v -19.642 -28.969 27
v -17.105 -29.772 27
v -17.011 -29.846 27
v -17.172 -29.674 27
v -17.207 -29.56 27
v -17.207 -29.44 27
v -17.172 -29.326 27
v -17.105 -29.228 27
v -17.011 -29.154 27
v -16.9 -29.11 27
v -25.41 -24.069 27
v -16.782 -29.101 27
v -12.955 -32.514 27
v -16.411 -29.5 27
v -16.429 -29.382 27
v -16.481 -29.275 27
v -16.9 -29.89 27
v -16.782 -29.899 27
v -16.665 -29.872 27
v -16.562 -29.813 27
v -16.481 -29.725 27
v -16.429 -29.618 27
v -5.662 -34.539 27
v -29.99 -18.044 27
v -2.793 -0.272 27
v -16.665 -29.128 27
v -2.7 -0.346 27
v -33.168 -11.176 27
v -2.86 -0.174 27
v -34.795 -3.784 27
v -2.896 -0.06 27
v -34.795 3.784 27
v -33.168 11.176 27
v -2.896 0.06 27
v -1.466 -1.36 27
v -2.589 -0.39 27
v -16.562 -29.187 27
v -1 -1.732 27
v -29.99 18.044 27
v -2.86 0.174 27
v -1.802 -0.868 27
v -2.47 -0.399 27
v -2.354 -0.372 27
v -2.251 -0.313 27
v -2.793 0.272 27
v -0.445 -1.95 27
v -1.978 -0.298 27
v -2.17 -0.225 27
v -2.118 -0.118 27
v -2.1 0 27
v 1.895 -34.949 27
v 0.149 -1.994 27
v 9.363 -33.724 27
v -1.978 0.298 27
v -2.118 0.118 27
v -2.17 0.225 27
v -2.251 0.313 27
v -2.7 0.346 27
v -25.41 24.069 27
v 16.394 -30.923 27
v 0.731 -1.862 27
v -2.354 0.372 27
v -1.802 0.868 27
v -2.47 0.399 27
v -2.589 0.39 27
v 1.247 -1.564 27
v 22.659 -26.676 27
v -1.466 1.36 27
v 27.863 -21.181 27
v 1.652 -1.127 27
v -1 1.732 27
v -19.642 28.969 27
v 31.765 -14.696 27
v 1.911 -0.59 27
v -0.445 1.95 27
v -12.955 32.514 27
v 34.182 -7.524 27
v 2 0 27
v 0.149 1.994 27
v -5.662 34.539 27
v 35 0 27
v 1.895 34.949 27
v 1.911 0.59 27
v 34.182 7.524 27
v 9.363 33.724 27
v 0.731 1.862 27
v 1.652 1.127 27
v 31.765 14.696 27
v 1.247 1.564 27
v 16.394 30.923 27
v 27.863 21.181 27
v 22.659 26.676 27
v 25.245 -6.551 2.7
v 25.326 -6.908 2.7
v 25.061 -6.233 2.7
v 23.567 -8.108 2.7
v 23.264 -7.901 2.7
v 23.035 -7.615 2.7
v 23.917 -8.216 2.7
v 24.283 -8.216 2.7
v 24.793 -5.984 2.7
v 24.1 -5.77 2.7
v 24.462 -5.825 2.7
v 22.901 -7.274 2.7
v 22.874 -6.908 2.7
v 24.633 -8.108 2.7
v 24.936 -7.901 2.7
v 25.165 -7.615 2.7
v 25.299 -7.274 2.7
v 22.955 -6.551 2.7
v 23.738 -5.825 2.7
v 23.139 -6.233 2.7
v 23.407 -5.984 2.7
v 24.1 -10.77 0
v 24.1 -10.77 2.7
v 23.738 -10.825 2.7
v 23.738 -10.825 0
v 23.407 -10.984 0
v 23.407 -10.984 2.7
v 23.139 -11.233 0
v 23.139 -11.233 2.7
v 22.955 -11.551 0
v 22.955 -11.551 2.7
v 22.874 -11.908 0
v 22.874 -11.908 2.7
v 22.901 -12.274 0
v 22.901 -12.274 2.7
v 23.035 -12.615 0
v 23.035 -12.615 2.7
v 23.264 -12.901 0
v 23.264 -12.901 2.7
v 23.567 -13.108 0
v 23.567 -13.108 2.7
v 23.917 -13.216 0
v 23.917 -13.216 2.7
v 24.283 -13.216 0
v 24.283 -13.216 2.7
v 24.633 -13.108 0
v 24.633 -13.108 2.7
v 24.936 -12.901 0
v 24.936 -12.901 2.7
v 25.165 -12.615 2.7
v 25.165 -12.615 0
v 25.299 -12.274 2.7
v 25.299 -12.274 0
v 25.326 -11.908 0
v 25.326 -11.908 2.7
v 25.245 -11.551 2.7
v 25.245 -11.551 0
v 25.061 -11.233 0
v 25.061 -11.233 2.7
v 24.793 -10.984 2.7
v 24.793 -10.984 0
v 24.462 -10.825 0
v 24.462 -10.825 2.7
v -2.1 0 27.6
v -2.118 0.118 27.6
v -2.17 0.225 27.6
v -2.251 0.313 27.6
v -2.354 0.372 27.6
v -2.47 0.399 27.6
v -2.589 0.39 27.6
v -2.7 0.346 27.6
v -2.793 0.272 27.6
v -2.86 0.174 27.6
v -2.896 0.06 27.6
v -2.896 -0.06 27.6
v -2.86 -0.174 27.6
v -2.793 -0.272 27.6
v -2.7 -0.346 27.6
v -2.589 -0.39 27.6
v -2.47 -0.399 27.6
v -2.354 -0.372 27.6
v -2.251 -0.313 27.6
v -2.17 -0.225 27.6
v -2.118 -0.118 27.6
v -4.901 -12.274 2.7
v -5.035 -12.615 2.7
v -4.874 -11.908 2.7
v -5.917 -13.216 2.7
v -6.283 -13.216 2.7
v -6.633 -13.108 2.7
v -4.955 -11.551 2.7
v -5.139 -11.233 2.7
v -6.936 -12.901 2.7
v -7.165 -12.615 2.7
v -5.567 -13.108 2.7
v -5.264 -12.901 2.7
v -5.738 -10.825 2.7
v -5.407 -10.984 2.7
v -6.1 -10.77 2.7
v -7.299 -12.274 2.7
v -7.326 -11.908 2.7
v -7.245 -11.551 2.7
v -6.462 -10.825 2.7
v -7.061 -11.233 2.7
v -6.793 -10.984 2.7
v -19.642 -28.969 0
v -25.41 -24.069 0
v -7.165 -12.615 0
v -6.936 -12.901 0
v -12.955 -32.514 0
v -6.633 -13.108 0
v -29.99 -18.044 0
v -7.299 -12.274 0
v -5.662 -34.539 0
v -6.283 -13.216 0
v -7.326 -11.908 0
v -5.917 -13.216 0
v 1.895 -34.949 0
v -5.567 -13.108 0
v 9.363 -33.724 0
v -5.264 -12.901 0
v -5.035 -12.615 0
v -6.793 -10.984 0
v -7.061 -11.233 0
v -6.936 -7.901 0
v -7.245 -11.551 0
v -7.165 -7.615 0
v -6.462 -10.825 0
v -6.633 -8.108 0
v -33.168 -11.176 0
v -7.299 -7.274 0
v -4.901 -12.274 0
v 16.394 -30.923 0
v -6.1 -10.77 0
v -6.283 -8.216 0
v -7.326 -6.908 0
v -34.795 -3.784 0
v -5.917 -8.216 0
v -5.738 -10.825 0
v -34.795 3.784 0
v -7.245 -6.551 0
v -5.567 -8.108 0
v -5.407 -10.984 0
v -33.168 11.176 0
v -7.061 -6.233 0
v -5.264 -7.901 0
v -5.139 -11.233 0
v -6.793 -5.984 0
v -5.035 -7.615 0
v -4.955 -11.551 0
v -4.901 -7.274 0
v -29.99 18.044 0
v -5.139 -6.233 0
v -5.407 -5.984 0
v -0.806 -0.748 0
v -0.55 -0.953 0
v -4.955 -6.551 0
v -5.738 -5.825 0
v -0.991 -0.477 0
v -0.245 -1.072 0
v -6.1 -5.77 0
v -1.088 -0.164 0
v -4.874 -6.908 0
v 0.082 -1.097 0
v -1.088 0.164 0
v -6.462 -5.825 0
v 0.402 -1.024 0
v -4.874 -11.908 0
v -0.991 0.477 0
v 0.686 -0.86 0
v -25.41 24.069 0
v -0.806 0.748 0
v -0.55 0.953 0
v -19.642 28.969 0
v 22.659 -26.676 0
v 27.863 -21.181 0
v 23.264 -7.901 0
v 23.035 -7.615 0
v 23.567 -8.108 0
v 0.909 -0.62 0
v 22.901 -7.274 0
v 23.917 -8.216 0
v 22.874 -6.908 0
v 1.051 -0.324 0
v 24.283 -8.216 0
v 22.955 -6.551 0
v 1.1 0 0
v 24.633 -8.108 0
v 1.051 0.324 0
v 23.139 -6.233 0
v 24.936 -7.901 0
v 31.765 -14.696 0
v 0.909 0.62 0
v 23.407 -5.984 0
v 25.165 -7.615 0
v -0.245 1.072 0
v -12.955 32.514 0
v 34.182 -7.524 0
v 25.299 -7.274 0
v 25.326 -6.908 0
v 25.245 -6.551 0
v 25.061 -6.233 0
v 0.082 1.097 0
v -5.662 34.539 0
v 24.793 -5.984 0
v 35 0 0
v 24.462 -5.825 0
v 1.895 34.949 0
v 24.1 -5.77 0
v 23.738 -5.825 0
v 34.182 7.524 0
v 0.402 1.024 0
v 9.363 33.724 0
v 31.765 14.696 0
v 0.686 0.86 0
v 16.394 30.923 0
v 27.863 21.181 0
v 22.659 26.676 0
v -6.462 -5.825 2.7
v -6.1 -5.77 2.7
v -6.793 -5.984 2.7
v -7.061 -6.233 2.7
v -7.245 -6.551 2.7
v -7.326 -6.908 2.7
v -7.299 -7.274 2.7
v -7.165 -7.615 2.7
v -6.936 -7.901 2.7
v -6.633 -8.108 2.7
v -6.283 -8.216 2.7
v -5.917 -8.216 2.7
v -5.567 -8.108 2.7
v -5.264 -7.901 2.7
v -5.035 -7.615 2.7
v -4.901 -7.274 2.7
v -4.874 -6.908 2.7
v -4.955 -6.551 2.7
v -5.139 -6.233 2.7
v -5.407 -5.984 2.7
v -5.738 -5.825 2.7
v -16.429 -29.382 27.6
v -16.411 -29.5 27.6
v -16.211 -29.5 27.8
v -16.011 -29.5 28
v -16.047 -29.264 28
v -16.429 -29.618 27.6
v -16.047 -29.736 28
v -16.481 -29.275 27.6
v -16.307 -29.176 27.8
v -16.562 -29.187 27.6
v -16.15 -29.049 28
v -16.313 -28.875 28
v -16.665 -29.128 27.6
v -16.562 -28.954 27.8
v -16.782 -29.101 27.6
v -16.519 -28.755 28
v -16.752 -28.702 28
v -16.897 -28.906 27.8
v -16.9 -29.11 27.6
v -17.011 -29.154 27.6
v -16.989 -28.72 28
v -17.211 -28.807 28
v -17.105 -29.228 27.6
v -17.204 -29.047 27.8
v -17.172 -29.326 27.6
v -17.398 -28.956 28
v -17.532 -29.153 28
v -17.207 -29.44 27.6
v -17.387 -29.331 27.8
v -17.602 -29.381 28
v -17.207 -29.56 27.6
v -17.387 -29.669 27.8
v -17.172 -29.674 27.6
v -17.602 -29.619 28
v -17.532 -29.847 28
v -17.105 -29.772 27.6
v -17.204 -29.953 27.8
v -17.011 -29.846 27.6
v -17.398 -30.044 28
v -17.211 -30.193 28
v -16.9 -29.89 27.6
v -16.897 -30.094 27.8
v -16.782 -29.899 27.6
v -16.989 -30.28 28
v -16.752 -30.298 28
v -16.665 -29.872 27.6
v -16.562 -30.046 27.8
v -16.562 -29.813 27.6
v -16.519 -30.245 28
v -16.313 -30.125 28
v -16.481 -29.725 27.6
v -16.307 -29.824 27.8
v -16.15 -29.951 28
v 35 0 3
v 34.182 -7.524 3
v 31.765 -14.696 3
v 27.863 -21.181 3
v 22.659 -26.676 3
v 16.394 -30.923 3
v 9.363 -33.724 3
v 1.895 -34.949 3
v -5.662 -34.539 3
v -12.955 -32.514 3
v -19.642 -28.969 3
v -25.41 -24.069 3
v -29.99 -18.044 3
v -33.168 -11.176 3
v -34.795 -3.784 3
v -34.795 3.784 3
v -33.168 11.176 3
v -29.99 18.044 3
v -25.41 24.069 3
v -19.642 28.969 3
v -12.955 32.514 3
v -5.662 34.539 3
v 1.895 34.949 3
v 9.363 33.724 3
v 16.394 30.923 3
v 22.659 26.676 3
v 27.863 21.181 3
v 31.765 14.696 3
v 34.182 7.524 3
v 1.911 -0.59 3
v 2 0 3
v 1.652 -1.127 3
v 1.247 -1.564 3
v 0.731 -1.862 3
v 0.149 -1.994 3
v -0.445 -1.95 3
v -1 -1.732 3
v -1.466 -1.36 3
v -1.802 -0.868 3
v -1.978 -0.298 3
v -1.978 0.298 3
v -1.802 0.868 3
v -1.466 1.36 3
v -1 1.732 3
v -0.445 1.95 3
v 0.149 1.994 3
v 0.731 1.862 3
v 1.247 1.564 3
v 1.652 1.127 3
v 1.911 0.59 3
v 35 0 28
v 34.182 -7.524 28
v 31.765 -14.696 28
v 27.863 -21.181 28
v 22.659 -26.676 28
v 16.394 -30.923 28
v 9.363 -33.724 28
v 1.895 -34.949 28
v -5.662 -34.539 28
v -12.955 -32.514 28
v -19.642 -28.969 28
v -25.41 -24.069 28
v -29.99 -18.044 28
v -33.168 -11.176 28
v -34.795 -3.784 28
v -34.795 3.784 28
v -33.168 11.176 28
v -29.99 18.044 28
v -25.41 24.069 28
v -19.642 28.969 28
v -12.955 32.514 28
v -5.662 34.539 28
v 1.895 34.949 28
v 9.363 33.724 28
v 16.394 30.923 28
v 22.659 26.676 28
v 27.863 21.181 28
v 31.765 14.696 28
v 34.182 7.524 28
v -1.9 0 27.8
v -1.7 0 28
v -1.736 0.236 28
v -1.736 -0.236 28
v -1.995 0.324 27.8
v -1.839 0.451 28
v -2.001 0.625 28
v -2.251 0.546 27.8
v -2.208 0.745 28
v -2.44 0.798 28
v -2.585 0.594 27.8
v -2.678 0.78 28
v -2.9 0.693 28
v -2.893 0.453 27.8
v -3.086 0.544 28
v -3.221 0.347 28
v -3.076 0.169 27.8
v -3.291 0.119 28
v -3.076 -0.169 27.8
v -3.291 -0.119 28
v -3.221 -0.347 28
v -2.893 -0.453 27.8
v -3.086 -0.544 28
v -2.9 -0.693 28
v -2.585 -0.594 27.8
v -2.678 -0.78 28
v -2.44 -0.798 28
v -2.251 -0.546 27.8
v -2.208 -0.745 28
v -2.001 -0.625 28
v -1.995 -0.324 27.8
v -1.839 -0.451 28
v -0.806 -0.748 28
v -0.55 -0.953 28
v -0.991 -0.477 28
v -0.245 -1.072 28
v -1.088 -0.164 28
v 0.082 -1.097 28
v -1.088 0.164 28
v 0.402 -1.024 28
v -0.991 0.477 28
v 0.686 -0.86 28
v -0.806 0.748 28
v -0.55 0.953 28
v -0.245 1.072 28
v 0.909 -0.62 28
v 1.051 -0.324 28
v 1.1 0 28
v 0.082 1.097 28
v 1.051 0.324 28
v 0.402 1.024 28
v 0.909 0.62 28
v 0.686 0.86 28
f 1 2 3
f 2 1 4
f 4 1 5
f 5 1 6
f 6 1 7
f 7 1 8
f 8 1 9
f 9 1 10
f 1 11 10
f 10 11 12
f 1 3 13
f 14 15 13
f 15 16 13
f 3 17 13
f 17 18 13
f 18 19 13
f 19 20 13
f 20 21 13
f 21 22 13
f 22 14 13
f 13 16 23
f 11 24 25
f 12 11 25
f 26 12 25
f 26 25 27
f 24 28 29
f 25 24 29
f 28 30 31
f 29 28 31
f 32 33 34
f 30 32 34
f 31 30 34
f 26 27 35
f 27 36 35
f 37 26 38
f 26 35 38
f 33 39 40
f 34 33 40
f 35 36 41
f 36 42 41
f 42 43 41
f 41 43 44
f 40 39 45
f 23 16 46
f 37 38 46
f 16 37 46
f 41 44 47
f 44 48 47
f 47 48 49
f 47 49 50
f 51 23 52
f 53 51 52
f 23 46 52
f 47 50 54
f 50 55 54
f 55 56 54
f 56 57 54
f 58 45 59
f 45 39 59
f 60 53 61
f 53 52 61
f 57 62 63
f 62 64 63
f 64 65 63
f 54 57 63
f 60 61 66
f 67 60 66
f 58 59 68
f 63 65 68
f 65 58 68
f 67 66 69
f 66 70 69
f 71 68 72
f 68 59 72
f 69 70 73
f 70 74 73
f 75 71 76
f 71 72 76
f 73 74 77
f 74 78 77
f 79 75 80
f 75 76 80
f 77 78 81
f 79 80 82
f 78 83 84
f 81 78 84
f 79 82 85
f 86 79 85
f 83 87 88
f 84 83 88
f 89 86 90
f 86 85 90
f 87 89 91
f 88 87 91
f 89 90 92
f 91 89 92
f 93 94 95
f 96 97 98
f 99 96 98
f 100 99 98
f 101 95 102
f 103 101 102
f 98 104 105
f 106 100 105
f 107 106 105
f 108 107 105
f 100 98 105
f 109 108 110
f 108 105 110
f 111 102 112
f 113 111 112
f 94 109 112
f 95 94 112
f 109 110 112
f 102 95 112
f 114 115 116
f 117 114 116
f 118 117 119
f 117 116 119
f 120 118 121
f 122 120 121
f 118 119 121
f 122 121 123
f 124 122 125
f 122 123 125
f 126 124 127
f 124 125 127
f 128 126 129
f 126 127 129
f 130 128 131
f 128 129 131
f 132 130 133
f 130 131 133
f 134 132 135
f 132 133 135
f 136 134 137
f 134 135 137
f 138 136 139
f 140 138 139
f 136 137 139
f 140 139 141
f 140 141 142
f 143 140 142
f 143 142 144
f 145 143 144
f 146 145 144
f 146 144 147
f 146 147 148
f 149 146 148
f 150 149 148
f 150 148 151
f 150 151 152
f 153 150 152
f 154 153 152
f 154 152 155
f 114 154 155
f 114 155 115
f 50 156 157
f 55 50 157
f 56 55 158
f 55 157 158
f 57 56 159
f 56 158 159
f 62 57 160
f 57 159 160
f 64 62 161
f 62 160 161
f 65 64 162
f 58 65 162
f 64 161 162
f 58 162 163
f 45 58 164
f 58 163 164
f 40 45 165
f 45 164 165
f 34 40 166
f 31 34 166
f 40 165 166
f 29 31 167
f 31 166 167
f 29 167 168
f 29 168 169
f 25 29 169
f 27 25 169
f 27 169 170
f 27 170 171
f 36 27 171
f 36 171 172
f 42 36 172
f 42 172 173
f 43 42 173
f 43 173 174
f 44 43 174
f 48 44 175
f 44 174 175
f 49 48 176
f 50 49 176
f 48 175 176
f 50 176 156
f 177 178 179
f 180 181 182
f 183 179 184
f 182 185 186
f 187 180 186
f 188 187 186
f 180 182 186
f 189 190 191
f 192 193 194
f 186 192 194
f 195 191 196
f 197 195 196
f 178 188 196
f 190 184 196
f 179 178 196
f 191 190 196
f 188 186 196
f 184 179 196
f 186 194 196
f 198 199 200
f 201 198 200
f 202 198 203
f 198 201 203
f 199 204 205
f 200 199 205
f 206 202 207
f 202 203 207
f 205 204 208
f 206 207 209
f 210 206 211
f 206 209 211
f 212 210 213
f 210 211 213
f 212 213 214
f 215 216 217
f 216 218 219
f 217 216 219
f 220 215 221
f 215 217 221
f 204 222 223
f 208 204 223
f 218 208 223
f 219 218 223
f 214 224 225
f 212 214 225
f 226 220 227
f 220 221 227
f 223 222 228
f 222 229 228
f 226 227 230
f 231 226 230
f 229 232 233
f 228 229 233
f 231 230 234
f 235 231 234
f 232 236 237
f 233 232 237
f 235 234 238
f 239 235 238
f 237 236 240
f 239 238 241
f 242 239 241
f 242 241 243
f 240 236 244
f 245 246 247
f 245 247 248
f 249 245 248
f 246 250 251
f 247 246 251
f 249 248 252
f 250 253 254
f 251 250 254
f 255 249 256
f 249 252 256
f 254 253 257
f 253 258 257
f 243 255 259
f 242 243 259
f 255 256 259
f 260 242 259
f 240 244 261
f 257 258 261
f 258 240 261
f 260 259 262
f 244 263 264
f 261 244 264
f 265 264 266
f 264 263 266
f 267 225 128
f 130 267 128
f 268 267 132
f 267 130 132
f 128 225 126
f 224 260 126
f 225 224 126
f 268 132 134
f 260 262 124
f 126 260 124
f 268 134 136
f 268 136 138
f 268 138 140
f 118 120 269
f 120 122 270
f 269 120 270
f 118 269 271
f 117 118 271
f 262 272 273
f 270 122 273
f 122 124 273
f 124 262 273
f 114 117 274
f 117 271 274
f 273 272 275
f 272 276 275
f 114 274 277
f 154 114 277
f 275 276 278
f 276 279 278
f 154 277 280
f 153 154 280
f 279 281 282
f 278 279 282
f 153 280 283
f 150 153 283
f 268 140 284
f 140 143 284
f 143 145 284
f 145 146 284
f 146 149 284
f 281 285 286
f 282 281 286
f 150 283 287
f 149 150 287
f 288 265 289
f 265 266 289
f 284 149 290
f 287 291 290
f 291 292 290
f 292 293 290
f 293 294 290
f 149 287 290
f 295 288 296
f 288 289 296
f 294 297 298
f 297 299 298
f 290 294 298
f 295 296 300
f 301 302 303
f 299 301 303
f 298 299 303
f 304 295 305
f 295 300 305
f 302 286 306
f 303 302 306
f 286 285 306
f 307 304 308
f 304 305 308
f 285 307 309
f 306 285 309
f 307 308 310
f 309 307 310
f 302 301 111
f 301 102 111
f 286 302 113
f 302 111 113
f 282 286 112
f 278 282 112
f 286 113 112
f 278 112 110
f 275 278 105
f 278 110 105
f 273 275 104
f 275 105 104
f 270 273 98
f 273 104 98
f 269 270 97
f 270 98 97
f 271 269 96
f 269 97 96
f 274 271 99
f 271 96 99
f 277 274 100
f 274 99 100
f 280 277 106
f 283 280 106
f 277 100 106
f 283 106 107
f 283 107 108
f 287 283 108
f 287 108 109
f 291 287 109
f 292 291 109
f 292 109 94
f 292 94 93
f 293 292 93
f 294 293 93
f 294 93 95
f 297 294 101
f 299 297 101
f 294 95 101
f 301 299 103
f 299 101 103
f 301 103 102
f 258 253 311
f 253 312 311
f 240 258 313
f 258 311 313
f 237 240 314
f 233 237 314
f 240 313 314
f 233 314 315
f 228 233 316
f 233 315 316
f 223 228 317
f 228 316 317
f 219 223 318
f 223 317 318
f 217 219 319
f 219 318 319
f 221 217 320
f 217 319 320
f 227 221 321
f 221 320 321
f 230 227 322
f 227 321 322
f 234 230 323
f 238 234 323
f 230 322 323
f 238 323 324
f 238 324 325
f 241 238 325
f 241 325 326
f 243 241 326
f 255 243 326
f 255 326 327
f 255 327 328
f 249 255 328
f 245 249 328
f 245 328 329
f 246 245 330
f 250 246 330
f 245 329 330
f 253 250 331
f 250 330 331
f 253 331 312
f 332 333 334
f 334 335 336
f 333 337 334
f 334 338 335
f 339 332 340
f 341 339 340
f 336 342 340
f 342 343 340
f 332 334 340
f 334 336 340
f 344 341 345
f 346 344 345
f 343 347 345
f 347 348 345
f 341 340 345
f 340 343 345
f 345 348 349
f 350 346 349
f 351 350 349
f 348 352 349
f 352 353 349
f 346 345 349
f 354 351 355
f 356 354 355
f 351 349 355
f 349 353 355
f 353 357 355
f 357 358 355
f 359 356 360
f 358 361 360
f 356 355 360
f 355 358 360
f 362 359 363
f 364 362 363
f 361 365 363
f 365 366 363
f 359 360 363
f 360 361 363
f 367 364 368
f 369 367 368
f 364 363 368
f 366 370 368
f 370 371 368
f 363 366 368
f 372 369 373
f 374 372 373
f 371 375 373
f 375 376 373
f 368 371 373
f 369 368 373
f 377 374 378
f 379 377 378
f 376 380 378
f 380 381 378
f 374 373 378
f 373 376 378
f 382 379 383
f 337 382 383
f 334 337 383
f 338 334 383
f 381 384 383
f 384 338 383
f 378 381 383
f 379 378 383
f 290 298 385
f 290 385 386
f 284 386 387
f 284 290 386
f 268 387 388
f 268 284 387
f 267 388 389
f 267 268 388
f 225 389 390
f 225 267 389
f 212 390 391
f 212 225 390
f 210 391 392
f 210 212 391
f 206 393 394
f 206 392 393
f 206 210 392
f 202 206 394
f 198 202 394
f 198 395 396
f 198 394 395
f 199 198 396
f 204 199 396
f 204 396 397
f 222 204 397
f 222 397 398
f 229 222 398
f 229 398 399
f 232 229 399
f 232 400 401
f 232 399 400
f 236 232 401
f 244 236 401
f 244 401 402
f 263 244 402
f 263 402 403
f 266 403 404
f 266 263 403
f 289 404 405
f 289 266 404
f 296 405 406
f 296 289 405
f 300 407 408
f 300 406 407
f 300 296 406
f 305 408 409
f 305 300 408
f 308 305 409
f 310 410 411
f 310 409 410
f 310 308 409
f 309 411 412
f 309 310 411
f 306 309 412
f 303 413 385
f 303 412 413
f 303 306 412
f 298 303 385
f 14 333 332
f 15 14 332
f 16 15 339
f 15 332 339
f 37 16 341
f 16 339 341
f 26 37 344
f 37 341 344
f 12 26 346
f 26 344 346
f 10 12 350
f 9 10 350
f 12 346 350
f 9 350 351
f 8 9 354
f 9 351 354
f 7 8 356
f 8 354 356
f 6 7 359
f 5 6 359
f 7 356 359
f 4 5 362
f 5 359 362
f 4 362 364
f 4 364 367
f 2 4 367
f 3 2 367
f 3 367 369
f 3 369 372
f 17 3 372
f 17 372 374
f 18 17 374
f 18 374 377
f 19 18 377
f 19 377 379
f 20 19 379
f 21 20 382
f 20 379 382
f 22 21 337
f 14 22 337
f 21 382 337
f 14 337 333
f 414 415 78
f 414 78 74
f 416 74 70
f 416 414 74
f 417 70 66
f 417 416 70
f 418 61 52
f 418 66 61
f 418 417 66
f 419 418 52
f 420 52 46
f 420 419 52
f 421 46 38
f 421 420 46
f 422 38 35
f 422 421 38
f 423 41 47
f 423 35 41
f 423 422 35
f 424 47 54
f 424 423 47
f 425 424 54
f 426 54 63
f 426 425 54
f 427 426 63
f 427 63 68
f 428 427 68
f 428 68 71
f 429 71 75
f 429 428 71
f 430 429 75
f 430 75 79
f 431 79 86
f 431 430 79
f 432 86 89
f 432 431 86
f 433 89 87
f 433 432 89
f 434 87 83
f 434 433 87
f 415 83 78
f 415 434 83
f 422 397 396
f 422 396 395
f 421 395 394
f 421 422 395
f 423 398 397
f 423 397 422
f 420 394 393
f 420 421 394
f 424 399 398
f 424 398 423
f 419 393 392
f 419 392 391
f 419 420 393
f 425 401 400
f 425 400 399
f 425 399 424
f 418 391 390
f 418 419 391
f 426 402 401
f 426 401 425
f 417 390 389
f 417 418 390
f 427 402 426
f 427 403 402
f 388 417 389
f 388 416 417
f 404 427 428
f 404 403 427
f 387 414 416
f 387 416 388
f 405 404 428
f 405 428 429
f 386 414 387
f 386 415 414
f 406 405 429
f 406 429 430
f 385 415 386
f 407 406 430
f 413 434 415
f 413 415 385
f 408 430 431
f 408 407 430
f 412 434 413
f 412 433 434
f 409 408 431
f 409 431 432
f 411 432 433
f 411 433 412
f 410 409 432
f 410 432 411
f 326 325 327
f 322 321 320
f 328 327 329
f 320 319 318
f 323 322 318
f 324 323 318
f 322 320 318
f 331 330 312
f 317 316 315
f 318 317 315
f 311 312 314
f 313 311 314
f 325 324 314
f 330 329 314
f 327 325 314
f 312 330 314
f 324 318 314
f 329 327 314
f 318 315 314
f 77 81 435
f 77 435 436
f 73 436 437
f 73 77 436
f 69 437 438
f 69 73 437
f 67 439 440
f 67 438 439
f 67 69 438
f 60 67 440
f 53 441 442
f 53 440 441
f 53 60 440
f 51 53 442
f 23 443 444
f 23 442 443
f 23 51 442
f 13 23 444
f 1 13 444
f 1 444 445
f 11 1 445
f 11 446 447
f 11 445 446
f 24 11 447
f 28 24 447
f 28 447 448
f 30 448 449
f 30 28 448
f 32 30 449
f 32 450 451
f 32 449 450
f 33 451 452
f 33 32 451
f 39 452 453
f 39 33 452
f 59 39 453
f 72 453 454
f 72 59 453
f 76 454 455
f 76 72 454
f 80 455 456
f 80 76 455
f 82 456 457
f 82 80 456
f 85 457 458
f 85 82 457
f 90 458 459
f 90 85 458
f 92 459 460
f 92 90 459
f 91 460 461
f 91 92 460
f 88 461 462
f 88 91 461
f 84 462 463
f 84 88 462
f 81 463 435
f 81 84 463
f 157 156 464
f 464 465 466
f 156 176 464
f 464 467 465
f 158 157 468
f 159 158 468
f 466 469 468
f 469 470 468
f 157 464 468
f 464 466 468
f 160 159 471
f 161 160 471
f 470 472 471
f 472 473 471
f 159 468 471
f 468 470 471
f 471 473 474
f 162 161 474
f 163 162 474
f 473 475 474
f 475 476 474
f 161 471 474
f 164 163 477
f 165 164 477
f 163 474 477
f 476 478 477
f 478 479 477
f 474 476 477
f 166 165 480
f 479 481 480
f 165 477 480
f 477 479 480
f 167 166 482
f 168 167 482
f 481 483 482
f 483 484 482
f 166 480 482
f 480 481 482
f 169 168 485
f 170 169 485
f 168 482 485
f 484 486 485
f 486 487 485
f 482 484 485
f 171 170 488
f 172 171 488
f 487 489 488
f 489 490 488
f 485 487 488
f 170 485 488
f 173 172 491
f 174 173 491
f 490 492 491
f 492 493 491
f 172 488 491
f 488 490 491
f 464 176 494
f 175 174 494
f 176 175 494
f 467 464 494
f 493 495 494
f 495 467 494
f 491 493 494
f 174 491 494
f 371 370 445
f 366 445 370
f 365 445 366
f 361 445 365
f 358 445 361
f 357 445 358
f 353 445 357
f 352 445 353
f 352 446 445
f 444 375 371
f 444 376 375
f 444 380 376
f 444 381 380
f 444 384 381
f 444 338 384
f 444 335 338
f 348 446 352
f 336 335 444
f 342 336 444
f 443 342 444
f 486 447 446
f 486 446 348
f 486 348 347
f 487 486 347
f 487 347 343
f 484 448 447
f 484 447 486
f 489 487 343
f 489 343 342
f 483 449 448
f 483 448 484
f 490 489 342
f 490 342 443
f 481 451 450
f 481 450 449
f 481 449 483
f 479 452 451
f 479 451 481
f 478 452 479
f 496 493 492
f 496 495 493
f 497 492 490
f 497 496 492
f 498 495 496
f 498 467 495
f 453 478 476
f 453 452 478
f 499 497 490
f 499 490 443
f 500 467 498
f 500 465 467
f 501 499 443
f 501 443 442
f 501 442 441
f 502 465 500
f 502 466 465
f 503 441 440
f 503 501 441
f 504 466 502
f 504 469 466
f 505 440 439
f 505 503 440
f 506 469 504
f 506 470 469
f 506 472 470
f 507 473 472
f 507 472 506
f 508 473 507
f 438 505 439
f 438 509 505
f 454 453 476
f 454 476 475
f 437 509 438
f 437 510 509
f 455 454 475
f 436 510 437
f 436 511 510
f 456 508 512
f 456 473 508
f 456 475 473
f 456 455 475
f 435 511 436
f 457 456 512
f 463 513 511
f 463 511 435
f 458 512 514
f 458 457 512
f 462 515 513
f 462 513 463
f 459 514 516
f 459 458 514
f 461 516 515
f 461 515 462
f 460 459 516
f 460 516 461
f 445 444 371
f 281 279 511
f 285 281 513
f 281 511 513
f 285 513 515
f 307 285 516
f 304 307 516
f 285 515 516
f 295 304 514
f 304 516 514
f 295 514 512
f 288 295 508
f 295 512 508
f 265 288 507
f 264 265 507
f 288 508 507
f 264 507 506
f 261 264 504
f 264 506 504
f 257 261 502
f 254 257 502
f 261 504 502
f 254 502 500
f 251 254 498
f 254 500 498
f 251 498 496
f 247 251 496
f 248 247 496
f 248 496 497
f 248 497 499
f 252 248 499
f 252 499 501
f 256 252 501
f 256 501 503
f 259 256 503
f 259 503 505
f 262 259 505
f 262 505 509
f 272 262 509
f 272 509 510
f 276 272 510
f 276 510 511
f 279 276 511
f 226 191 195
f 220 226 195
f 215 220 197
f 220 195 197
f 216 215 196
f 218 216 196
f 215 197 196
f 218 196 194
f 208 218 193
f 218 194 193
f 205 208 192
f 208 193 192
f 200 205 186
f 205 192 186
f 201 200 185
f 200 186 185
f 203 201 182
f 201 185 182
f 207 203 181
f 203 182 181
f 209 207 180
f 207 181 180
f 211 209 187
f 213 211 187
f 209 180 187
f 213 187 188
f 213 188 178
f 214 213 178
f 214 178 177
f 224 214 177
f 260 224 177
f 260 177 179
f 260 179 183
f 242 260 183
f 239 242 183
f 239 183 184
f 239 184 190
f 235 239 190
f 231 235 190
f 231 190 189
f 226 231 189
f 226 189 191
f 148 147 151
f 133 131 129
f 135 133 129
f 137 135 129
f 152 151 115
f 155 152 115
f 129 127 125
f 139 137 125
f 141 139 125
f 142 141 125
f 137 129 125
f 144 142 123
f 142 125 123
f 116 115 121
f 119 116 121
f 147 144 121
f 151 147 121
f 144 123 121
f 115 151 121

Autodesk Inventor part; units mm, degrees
ref_plane "YZ Plane" through (0, 0, 0) normal (1, 0, 0) x (0, 1, 0)
ref_plane "XZ Plane" through (0, 0, 0) normal (0, 1, 0) x (-1, 0, 0)
ref_plane "XY Plane" through (0, 0, 0) normal (0, 0, 1) x (1, 0, 0)
sketch "Sketch1" plane through (0, 0, 0) normal (0, 0, 1) x (1, 0, 0)
  circle A0 centre (0, 0) radius 35
  dimension "d0" = 70
extrude "Extrusion1" add sketch "Sketch1" along normal blind 3
sketch "Sketch2" plane through (0, 0, 3) normal (0, 0, 1) x (1, 0, 0)
  circle A0 centre (0, 0) radius 2
  dimension "d3" = 4
extrude "Extrusion2" add sketch "Sketch2" along normal blind 24
sketch "Sketch3" plane through (0, 0, 27) normal (0, 0, 1) x (1, 0, 0)
  circle A0 centre (0, 0) radius 35
  dimension "d6" = 70
extrude "Extrusion3" add sketch "Sketch3" along normal blind 1
sketch "Sketch4" plane through (0, 0, 28) normal (0, 0, 1) x (1, 0, 0)
  circle A0 centre (0, 0) radius 1.1
  dimension "d9" = 2.2
extrude "Extrusion4" cut sketch "Sketch4" against normal through all
sketch "Sketch6" plane through (0, 0, 28) normal (0, 0, 1) x (1, 0, 0)
  circle A0 centre (0, 0) radius 2 construction
  circle A1 centre (-16.8114, -29.5) radius 0.4
  circle A2 centre (-2.5, 0) radius 0.4
  circle A3 centre (0, 0) radius 35 projected
  dimension "d20" = 0.8
  dimension "d21" = 0.8
  dimension "d32" = 2.5
  dimension "d41" = 29.5
sketch "Sketch7" plane through (0, 0, 28) normal (0, 0, 1) x (1, 0, 0)
  point P0 (0, 0)
extrude "Extrusion5" cut sketch "Sketch6" against normal up to surface (1 mm away) contours A1 | A2
chamfer "Chamfer1" distance 0.4 angle 45 2 edges at (-2.9, 0, 28) (-17.2114, -29.5, 28)
sketch "Sketch9" plane through (0, 0, 0) normal (0, 0, -1) x (-1, 0, 0)
  point P0 (0, 0)
  point P1 (6.1, -7)
  point P2 (-24.1, -7)
  point P3 (-24.1, -12)
  point P4 (6.1, -12)
  dimension "d44" = 6.1
  dimension "d45" = 24.1
  dimension "d46" = 7
  dimension "d47" = 7
  dimension "d48" = 5
  dimension "d49" = 5
hole "Hole2" at (24.1, -7, 0) at (-6.1, -7, 0) at (24.1, -12, 0) at (-6.1, -12, 0) direction (0, 0, 1) diameter 2.459 depth 2.7 thread size "M3x0.5" class "6H" standard "ISO Metric profile"
loft "Loft1" [suppressed]
properties part number "Bobbin_y_c"
